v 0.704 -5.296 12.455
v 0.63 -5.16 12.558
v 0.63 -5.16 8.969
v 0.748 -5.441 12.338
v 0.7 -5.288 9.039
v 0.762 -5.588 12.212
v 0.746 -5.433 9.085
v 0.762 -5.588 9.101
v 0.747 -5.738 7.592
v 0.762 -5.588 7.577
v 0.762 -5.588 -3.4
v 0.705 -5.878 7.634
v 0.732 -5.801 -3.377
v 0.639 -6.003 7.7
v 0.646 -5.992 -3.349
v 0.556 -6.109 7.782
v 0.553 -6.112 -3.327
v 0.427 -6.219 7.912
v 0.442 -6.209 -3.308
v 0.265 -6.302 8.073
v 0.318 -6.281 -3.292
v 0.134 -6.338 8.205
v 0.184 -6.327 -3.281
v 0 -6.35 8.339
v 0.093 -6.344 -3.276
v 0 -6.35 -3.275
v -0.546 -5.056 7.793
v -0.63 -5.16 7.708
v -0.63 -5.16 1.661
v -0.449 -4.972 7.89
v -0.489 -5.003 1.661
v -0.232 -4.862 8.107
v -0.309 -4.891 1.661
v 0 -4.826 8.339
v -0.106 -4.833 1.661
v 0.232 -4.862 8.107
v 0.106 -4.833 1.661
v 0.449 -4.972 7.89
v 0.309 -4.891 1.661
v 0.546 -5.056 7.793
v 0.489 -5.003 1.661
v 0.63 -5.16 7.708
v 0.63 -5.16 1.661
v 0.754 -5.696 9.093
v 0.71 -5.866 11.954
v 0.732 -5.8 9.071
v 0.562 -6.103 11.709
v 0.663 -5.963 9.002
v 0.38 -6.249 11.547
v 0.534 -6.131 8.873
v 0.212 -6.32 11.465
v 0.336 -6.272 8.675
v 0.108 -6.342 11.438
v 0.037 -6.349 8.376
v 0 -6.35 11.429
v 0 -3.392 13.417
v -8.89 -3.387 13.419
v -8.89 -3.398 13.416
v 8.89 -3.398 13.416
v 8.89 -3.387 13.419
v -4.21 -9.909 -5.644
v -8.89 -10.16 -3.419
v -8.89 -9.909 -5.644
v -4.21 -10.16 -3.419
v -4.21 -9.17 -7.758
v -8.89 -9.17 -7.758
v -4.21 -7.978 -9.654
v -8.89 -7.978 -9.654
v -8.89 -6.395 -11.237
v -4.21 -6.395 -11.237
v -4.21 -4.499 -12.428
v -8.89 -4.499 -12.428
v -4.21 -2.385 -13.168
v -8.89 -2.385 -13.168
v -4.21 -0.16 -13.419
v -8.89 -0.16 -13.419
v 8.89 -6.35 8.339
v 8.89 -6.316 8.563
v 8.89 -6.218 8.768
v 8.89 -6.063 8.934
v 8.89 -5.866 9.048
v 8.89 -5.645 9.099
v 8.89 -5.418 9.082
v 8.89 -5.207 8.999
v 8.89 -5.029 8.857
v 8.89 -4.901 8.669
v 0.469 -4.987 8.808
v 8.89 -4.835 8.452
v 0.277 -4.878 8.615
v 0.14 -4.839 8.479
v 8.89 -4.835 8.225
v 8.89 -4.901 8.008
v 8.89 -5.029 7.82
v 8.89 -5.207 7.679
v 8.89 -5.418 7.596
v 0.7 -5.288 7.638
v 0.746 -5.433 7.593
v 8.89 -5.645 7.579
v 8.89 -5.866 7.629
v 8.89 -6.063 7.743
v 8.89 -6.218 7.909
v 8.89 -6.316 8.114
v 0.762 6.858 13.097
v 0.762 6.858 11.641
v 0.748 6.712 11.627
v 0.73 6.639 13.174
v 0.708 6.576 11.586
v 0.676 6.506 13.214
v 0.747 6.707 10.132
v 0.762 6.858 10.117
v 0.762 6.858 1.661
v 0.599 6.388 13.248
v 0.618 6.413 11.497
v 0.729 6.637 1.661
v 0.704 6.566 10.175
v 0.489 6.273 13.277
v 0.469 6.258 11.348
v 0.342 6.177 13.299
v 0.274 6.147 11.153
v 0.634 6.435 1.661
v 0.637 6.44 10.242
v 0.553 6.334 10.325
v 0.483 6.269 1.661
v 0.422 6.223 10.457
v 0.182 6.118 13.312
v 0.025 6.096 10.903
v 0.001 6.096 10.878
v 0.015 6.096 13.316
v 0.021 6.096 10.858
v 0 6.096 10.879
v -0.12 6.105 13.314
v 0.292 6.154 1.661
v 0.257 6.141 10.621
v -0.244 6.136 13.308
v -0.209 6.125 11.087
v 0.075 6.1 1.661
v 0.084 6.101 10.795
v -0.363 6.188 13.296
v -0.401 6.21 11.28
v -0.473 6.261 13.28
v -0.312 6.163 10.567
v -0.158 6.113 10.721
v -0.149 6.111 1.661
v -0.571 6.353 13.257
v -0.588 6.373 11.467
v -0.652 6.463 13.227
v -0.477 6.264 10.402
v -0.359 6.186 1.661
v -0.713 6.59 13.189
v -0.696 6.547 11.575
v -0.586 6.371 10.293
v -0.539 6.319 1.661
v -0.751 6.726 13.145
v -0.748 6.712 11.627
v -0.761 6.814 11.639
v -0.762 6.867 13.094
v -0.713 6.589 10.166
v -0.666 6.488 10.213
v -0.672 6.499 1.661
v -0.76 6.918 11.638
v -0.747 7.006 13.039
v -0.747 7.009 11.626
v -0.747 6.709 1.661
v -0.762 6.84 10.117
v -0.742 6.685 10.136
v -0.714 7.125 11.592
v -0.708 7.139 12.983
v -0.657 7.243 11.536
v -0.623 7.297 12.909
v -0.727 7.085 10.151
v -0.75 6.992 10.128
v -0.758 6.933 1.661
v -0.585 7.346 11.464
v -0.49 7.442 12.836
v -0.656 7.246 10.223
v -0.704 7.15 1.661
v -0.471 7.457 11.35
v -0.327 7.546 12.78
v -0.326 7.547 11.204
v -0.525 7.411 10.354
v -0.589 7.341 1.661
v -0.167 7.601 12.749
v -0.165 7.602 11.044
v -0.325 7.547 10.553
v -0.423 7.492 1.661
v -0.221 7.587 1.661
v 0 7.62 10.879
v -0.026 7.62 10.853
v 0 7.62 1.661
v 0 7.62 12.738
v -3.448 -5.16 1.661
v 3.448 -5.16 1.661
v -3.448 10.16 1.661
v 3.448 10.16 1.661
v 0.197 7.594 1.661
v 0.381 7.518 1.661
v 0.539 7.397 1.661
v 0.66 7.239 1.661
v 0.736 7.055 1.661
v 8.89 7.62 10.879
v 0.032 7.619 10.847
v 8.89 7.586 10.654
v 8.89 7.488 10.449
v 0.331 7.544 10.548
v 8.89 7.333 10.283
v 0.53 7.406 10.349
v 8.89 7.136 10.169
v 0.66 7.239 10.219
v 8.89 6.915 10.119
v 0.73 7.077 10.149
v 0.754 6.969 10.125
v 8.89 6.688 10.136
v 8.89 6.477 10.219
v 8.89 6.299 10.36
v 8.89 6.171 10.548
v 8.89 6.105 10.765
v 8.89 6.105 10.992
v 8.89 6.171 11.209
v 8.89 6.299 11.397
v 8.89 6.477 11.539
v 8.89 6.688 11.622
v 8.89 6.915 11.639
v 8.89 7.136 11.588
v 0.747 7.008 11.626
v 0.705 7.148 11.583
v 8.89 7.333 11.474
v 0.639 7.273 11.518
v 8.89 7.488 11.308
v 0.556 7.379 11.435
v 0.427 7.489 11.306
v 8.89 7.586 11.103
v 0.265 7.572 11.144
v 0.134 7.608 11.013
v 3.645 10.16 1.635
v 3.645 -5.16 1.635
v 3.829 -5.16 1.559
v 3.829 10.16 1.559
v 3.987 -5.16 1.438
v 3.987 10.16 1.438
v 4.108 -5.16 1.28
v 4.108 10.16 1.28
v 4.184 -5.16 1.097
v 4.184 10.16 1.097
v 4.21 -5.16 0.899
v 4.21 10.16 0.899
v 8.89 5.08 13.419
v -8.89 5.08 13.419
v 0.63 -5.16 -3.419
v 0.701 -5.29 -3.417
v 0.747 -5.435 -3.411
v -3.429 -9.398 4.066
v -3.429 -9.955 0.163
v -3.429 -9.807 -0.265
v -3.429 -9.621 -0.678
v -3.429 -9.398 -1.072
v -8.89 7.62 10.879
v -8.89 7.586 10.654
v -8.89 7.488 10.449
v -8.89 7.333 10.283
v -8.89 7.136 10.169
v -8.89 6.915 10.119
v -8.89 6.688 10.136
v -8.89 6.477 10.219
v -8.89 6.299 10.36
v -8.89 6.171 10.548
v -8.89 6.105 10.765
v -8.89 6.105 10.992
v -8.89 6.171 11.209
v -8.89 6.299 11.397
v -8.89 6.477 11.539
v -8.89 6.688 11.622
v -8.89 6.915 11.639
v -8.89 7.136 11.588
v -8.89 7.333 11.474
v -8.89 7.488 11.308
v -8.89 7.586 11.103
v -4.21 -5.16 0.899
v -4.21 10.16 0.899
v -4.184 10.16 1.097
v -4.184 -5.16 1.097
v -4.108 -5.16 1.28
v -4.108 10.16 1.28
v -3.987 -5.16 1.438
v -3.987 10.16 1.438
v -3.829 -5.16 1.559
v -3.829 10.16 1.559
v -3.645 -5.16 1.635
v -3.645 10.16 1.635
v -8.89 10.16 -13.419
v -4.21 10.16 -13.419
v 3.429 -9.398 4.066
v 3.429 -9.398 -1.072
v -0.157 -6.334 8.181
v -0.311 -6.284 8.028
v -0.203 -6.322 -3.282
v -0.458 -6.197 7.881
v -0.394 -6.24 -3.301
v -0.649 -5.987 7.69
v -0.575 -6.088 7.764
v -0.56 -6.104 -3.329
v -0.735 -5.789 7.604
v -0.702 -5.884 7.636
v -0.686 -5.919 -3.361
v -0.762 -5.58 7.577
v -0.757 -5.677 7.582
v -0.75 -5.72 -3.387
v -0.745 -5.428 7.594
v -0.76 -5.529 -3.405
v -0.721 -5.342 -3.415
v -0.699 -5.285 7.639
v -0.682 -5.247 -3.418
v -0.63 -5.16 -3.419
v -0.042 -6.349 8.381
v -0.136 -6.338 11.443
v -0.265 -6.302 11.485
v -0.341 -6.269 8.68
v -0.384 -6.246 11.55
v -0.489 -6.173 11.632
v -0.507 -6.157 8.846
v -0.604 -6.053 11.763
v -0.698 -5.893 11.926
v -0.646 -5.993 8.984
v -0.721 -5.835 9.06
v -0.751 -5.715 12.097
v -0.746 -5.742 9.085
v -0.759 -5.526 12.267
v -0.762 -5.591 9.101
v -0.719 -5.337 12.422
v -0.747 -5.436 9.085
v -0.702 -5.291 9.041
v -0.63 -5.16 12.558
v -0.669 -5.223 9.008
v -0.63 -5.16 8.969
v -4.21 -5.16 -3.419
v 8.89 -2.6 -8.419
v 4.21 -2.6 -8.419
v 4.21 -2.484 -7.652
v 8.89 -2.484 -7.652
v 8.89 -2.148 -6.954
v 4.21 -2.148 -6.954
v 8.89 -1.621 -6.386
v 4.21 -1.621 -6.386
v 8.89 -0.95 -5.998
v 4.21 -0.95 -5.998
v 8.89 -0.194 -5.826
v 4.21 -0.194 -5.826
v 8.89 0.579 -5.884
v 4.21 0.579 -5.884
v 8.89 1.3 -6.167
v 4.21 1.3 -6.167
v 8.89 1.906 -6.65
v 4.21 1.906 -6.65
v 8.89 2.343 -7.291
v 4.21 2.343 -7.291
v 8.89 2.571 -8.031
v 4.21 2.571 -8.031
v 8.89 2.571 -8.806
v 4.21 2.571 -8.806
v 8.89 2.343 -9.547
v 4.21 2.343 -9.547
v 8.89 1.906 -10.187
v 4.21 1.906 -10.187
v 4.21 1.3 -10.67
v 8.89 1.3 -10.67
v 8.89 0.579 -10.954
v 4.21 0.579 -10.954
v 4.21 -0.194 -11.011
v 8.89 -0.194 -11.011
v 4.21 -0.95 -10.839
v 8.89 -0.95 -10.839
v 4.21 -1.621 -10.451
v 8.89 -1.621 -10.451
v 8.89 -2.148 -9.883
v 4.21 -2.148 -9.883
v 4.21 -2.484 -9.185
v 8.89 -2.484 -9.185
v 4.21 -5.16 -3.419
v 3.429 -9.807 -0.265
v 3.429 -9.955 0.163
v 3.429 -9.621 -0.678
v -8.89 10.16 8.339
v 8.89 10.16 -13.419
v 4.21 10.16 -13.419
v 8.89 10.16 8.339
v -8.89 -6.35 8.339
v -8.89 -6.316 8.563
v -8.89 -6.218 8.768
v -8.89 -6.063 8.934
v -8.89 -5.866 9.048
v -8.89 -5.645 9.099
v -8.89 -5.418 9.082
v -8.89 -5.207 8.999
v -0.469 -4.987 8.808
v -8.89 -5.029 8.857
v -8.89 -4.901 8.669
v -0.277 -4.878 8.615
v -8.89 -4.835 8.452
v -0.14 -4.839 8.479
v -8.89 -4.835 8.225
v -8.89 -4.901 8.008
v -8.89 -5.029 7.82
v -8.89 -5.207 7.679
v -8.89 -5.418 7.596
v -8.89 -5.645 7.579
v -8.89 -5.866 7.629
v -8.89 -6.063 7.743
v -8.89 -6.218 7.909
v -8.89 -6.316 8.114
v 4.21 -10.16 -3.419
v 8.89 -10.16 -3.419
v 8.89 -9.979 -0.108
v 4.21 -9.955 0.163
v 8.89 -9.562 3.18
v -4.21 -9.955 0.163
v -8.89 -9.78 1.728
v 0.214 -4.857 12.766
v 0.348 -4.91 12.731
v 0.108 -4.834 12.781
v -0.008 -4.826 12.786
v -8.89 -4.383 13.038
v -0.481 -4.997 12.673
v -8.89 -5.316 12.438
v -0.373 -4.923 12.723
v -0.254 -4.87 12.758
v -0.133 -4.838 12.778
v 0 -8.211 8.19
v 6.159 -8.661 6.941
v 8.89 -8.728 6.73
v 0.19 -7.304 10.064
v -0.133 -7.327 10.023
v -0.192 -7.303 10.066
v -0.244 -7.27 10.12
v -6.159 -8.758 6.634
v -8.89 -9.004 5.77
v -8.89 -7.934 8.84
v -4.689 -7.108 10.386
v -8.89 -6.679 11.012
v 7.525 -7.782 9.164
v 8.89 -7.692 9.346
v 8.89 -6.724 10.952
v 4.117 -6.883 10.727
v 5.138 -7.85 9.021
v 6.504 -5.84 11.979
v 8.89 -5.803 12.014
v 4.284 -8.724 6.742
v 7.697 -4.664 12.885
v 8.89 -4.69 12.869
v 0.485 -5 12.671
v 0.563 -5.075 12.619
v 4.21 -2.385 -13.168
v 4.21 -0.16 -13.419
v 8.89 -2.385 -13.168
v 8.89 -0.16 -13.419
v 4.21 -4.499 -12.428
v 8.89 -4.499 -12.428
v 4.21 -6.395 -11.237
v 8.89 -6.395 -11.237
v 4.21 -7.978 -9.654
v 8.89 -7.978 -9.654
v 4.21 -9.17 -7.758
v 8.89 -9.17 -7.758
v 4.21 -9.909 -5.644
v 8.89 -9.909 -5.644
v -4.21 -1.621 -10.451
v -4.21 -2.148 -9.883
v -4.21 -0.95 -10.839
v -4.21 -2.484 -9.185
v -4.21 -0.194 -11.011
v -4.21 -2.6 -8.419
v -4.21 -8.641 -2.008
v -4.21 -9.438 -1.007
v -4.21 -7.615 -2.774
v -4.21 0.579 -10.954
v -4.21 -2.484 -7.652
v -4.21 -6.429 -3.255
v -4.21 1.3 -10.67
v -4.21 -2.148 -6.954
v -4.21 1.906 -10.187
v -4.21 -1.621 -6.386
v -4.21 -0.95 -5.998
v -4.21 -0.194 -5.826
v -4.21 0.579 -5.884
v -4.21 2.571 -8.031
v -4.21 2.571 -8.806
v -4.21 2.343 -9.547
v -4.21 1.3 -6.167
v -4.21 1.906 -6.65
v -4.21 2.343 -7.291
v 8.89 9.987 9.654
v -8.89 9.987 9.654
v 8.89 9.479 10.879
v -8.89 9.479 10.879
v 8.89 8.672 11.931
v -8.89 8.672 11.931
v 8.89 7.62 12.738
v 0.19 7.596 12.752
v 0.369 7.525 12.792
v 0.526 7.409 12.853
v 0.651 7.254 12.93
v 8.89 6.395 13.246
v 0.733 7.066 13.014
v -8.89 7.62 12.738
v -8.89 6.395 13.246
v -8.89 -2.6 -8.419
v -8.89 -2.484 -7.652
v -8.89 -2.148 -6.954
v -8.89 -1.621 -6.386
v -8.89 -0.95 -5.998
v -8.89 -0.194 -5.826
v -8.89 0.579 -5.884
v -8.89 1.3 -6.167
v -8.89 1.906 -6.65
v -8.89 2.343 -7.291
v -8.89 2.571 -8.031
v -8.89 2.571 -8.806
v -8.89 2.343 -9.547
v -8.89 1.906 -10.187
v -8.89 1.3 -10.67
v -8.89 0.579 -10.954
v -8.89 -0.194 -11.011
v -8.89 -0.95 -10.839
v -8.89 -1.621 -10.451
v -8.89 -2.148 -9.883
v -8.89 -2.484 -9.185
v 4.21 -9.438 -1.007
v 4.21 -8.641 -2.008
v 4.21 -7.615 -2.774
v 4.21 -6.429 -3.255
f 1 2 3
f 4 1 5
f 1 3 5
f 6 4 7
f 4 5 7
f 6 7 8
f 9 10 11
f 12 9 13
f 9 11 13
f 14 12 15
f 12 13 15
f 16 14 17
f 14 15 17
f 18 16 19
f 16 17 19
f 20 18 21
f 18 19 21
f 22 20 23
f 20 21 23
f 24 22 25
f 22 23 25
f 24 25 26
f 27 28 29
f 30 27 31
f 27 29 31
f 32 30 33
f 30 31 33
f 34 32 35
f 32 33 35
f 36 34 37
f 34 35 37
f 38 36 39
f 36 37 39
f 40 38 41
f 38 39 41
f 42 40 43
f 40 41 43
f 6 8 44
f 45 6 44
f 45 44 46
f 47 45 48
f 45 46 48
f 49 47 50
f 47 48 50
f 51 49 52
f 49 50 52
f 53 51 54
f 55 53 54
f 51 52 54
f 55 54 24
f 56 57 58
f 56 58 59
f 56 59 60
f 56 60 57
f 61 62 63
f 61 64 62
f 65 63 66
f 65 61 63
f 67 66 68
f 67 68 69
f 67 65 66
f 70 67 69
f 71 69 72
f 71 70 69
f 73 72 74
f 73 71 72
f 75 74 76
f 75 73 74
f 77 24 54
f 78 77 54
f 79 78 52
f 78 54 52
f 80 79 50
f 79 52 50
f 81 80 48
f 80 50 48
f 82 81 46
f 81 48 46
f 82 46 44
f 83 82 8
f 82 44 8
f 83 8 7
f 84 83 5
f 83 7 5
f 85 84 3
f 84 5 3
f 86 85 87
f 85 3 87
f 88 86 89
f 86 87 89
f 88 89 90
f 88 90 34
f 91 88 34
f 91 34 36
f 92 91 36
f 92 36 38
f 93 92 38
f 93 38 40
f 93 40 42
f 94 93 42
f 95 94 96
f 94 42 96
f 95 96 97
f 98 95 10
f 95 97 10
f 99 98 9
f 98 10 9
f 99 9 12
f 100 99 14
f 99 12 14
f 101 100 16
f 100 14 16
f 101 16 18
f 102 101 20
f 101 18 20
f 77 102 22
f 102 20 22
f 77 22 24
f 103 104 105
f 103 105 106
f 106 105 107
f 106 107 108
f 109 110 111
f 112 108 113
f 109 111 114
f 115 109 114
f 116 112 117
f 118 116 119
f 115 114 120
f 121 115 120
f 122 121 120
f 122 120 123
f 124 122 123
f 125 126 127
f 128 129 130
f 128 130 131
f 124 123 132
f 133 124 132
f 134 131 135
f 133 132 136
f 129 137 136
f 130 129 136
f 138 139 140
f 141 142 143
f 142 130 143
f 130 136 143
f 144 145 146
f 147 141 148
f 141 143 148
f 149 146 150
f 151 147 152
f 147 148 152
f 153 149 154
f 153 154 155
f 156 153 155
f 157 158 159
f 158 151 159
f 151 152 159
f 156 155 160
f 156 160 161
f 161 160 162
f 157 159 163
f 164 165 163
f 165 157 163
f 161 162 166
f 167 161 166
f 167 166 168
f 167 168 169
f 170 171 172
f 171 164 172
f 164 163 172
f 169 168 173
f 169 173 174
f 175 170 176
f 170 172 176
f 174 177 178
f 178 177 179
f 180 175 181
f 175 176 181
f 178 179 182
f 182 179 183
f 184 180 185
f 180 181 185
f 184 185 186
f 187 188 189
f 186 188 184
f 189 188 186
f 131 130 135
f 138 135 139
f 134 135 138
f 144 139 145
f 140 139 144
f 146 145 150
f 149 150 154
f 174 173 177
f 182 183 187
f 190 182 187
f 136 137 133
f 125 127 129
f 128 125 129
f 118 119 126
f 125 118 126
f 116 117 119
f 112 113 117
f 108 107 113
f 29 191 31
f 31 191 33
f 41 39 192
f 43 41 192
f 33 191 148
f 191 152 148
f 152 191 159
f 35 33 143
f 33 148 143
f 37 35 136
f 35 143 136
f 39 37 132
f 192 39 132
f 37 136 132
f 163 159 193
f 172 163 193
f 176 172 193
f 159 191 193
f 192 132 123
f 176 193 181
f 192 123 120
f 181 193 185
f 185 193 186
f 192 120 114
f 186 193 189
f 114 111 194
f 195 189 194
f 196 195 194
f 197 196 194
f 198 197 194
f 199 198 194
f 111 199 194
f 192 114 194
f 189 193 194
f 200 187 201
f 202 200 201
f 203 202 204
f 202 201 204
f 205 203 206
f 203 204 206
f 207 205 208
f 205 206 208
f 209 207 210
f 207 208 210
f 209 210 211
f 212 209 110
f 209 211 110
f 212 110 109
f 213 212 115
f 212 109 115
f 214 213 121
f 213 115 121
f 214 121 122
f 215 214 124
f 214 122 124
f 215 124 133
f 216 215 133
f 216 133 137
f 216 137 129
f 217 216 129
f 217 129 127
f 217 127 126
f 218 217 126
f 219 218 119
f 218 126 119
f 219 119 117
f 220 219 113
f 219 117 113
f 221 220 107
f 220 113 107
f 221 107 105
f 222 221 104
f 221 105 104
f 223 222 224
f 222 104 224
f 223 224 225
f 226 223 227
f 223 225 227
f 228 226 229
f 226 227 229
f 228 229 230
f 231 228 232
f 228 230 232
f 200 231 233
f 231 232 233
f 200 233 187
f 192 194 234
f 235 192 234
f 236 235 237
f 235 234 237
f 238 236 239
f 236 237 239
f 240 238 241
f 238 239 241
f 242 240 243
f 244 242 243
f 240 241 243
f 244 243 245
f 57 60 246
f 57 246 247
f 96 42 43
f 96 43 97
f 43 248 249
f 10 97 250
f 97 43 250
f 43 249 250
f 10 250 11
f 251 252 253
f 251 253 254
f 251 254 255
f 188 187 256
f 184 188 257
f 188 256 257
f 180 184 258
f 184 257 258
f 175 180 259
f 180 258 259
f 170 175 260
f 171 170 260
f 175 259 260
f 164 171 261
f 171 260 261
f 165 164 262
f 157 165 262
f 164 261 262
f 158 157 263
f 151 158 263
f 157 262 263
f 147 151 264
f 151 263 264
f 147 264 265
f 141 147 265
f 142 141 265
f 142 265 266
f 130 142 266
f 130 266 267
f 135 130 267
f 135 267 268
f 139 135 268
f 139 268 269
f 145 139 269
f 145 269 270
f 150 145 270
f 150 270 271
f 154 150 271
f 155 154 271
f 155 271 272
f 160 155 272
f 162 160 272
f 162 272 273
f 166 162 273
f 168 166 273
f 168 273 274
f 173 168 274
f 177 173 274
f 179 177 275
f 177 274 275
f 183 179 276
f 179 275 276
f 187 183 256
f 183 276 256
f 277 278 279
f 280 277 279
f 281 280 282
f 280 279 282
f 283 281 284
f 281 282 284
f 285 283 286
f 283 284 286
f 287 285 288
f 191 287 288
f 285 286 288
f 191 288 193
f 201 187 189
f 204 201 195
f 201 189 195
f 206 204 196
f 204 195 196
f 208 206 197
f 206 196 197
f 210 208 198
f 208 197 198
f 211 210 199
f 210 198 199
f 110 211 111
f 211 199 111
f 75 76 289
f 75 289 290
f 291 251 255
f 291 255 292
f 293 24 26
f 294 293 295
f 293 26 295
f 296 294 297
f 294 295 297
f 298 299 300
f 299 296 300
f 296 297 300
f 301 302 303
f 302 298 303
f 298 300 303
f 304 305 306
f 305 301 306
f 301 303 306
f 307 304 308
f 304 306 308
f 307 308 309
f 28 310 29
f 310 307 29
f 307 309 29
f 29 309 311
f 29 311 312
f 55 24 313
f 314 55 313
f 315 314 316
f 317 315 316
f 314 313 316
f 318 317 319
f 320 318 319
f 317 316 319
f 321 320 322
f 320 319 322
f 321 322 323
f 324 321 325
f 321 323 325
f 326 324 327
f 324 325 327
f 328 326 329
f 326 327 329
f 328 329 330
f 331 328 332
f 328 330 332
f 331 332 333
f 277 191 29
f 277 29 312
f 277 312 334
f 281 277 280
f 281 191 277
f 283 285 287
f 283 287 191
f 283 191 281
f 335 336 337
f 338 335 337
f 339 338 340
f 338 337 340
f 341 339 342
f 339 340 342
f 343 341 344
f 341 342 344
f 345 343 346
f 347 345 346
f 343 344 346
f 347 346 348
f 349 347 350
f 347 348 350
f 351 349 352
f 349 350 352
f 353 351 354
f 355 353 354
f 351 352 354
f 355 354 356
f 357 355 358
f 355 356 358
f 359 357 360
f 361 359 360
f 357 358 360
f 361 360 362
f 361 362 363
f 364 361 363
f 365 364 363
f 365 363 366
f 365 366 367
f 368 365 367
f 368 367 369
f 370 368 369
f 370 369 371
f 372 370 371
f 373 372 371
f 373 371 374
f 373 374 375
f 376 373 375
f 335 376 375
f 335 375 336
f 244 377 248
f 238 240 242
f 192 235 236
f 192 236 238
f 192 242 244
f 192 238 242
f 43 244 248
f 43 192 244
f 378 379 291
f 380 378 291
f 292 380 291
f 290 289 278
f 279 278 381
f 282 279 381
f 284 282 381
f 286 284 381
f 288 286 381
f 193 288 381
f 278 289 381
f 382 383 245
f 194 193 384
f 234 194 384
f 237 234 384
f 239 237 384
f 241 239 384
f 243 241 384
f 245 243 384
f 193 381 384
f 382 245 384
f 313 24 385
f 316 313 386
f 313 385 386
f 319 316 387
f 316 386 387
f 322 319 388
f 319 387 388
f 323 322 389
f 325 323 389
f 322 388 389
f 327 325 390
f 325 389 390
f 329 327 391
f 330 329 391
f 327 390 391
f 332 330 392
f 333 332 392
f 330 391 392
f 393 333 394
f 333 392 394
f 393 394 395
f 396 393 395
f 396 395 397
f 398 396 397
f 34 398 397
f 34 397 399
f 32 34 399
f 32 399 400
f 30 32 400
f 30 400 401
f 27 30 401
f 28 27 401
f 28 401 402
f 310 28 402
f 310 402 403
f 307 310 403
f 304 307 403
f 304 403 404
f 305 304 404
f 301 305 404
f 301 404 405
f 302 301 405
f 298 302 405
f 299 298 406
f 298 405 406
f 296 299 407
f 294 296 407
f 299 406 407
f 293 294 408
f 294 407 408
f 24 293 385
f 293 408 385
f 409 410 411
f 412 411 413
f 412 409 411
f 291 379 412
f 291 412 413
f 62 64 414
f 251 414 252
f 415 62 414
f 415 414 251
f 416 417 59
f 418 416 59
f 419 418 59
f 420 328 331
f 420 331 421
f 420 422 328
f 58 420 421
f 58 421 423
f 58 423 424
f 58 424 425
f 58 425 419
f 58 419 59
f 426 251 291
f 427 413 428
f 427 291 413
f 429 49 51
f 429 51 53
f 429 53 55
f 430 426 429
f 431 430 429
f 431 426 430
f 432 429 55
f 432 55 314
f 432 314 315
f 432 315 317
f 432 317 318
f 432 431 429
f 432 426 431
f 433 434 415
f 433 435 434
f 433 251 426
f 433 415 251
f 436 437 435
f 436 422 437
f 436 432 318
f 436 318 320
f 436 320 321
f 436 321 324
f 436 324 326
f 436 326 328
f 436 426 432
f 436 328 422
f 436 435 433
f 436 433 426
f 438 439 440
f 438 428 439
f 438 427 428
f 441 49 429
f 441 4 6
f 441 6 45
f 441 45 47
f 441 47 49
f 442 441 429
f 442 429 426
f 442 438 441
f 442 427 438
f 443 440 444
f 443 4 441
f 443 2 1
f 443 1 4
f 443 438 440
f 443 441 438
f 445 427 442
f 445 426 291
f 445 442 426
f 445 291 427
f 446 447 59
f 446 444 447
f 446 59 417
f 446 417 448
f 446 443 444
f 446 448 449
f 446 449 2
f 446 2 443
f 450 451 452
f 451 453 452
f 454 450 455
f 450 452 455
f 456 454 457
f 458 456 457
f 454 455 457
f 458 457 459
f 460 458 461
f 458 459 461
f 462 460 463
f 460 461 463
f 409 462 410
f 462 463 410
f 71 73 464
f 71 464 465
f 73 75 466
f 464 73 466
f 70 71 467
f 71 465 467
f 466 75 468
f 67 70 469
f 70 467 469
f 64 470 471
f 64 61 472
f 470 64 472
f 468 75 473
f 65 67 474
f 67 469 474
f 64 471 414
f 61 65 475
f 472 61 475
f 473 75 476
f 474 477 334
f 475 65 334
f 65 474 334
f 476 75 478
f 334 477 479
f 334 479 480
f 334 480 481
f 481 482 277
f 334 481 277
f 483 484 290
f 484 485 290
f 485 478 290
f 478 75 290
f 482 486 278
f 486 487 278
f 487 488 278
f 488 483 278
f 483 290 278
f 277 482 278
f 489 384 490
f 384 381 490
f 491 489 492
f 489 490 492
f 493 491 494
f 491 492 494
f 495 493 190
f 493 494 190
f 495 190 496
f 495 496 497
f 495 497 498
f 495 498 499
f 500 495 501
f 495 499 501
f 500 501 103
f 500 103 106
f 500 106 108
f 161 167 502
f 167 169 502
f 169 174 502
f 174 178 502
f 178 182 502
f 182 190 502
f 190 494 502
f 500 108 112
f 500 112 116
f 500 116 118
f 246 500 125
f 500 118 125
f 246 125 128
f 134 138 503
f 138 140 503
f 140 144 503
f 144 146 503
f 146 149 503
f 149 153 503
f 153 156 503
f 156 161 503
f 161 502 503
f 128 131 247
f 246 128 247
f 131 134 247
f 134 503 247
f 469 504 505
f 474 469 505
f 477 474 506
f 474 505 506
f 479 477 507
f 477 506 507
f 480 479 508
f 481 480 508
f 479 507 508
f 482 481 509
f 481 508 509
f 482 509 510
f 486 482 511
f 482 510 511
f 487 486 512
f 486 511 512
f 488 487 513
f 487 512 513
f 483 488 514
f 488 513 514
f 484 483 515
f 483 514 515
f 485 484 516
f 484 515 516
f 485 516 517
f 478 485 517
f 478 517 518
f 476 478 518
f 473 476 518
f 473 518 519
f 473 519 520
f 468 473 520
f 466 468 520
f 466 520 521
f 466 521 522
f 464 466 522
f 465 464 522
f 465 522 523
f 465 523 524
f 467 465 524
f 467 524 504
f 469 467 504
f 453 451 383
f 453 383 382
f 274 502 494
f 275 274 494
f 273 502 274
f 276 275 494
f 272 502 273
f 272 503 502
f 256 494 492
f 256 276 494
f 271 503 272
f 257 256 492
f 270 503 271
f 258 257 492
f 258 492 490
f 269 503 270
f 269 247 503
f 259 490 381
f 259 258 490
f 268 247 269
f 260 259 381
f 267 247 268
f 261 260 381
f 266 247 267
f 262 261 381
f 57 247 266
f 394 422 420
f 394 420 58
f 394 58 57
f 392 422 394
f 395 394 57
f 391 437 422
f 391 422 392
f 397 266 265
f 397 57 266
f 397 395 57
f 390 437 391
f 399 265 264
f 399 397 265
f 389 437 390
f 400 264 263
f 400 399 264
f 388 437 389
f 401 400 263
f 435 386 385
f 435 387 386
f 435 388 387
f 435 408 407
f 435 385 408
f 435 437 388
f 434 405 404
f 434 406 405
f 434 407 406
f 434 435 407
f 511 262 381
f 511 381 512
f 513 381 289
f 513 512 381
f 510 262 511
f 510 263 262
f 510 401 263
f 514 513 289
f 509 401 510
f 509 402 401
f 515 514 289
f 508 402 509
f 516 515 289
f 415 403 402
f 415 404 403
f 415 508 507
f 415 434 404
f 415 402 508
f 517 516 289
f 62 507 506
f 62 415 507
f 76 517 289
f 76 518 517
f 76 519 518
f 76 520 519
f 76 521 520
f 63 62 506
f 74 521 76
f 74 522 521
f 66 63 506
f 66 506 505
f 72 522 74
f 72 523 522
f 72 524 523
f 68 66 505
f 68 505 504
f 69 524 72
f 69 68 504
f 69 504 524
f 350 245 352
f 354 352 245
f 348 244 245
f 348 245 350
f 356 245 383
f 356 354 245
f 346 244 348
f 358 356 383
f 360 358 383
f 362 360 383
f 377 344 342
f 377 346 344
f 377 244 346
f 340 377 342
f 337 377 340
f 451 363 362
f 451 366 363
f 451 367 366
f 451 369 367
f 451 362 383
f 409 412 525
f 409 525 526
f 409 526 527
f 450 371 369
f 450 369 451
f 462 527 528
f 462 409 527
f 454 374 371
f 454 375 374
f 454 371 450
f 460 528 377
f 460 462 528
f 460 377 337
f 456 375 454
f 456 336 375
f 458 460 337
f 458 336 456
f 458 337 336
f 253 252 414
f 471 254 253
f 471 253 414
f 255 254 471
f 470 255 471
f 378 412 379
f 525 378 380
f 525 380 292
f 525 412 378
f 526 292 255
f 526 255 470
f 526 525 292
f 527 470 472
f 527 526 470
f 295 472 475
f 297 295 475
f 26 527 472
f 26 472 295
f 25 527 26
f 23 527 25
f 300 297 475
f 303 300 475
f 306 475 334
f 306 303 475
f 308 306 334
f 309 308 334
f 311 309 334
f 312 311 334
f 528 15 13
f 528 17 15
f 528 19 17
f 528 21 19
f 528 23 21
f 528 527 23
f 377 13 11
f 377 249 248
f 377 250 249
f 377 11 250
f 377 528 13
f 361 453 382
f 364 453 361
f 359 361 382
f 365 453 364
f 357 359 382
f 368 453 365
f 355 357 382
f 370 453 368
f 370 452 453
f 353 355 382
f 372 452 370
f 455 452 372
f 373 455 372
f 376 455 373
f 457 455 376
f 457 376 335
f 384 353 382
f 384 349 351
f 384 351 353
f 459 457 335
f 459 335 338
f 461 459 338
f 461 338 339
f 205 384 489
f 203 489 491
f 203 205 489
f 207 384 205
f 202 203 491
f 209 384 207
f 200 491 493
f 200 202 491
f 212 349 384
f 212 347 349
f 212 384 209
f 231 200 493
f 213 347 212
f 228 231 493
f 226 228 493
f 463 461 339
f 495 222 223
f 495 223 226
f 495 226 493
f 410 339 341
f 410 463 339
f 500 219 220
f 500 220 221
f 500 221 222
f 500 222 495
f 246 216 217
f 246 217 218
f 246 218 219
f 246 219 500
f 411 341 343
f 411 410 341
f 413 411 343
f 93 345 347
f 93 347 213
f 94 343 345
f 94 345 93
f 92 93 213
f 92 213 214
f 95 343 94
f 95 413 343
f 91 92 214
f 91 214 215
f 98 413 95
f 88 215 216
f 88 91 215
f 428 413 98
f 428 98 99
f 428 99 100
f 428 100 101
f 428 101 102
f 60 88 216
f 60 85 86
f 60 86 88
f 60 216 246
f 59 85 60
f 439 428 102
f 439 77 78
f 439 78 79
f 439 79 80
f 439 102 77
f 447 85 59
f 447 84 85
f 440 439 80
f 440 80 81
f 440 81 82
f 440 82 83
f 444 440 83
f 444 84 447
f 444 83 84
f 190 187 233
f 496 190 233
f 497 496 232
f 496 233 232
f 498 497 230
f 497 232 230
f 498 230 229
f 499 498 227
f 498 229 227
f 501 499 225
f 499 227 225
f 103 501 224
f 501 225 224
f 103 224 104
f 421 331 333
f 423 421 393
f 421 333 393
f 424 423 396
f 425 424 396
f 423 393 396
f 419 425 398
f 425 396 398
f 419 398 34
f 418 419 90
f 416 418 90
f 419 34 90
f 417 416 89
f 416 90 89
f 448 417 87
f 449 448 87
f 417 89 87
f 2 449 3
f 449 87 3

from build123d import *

# Parameters (mm, degrees)
F1_DEPTH  = 10.16
F2_R      = 2.6
F3_DEPTH  = 17.781
F4_R      = 10
F5_R      = 5
F7_DEPTH  = 17.781
F8_R      = 5.08
F10_DEPTH = 16.8384001672
F11_R     = 0.762
F12_DEPTH = 17.7810001
F16_DEPTH = 15.32
F17_DEPTH = 0.762


# Not quite as in the source:
# - an extrude ends at something that could not be found from the text; its depth is read off the source's solid
# - a feature names something its author has since deleted; it is built from what else it names


with BuildPart() as f1:
    # F0 (on Front) → F1 (new body, symmetric)
    with BuildSketch(Plane.XZ):
        Polygon((4.21, -13.4187000336), (8.89, -13.4187000336), (8.89, 13.4187000336), (-8.89, 13.4187000336), (-8.89, -13.4187000336), (-4.21, -13.4187000336), (-4.21, -3.4187000336), (4.21, -3.4187000336), align=None)
    extrude(amount=F1_DEPTH, both=True)

    # F2 (on face) → F3 (cut, through all)
    with BuildSketch(Plane(origin=(-8.89, 0, 0), x_dir=(0, -1, 0), z_dir=(-1, 0, 0))):
        with Locations((0, -8.4187000336)):
            Circle(F2_R)
    extrude(amount=-F3_DEPTH, mode=Mode.SUBTRACT)

    # F4
    f4_edges = [f1.edges().sort_by_distance(p)[0] for p in [
        (6.55, -10.16, -13.4187),
        (-6.55, -10.16, -13.4187),
    ]]
    fillet(f4_edges, radius=F4_R)

    # F5
    f5_edges = [f1.edges().sort_by_distance(p)[0] for p in [
        (0, -10.16, -3.4187),
    ]]
    fillet(f5_edges, radius=F5_R)

    # F6 (on face) → F7 (cut, through all)
    with BuildSketch(Plane(origin=(-8.89, 0, 0), x_dir=(0, -1, 0), z_dir=(-1, 0, 0))):
        with BuildLine():
            Line((10.16, -3.4187000336), (10.16, 13.4187000336))
            Line((10.16, 13.4187000336), (3.3866666667, 13.4187000336))
            add(Edge.make_bspline(
                [(3.3981708443, 13.4156480579), (3.3924205969, 13.4171809572), (3.3866666667, 13.4187000336)],
                knots=[0, 0, 0, 0.0008386489, 0.0008386489, 0.0008386489], degree=2, weights=[1, 0.9999999121, 1]))
            add(Edge.make_bspline(
                [(10.16, -3.4187000336), (9.7910592754, 11.7114337008), (3.3981708443, 13.4156480579)],
                knots=[5.4107177834, 5.4107177834, 5.4107177834, 6.2831853072, 6.2831853072, 6.2831853072], degree=2, weights=[1, 0.9063494321, 1]))
        make_face()
    extrude(amount=-F7_DEPTH, mode=Mode.SUBTRACT)

    # F8
    f8_edges = [f1.edges().sort_by_distance(p)[0] for p in [
        (0, 10.16, 13.4187),
    ]]
    fillet(f8_edges, radius=F8_R)

    # F9 (on face) → F10 (cut, through all)
    with BuildSketch(Plane(origin=(0, 0, -3.4187000336), x_dir=(1, 0, 0), z_dir=(0, 0, -1))):
        with BuildLine():
            Line((0.6304442878, 5.16), (-0.6304442878, 5.16))
            ThreePointArc((-0.6304442878, 5.16), (0, 4.826), (0.6304442878, 5.16))
        make_face()
        with BuildLine():
            ThreePointArc((0, 6.35), (-0.6733424092, 5.9447267862), (-0.6304442878, 5.16))
            Line((-0.6304442878, 5.16), (0.6304442878, 5.16))
            ThreePointArc((0.6304442878, 5.16), (0.7283689132, 5.364118946), (0.762, 5.588))
            ThreePointArc((0.762, 5.588), (0.5388153673, 6.1268153673), (0, 6.35))
        make_face()
        with BuildLine():
            ThreePointArc((0.762, -6.858), (-0.5388153673, -6.3191846327), (0, -7.62))
            ThreePointArc((0, -7.62), (0.5388153673, -7.3968153673), (0.762, -6.858))
        make_face()
    extrude(amount=-F10_DEPTH, mode=Mode.SUBTRACT)

    # F11 (on face) → F12 (cut, through all)
    with BuildSketch(Plane(origin=(-8.89, 0, 0), x_dir=(0, -1, 0), z_dir=(-1, 0, 0))):
        with BuildLine():
            ThreePointArc((-6.096, 10.8787000336), (-6.858, 11.6407000336), (-7.62, 10.8787000336))
            ThreePointArc((-7.62, 10.8787000336), (-6.858, 10.1167000336), (-6.096, 10.8787000336))
        make_face()
        with Locations((5.588, 8.3387000336)):
            Circle(F11_R)
    extrude(amount=-F12_DEPTH, mode=Mode.SUBTRACT)

    # F15 (on face) → F16 (cut, through all)
    with BuildSketch(Plane(origin=(0, 10.16, 0), x_dir=(-1, 0, 0), z_dir=(0, 1, 0))):
        with BuildLine():
            Line((0, -3.4187000336), (0, 1.6612999664))
            Line((0, 1.6612999664), (-3.448, 1.6612999664))
            ThreePointArc((-3.448, 1.6612999664), (-3.9868153673, 1.4381153337), (-4.21, 0.8992999664))
            Line((-4.21, 0.8992999664), (-4.21, -3.4187000336))
            Line((-4.21, -3.4187000336), (0, -3.4187000336))
        make_face()
        with BuildLine():
            Line((3.448, 1.6612999664), (0, 1.6612999664))
            Line((0, 1.6612999664), (0, -3.4187000336))
            Line((0, -3.4187000336), (4.21, -3.4187000336))
            Line((4.21, -3.4187000336), (4.21, 0.8992999664))
            ThreePointArc((4.21, 0.8992999664), (3.9868153673, 1.4381153337), (3.448, 1.6612999664))
        make_face()
    extrude(amount=-F16_DEPTH, mode=Mode.SUBTRACT)

    # F14 (on face) → F17 (cut)
    with BuildSketch(Plane.XZ.offset(10.16)):
        with BuildLine():
            Line((0, 6.9417000336), (3.429, 6.9417000336))
            ThreePointArc((3.429, 6.9417000336), (2.4246691527, 9.3663691863), (0, 10.3707000336))
            ThreePointArc((0, 10.3707000336), (-2.4246691527, 9.3663691863), (-3.429, 6.9417000336))
            Line((-3.429, 6.9417000336), (0, 6.9417000336))
        make_face()
        with BuildLine():
            ThreePointArc((-3.429, 6.9417000336), (0, 3.5127000336), (3.429, 6.9417000336))
            Line((3.429, 6.9417000336), (0, 6.9417000336))
            Line((0, 6.9417000336), (-3.429, 6.9417000336))
        make_face()
        with BuildLine():
            Line((3.429, -3.4187000336), (3.429, 6.9417000336))
            ThreePointArc((3.429, 6.9417000336), (0, 3.5127000336), (-3.429, 6.9417000336))
            Line((-3.429, 6.9417000336), (-3.429, -3.4187000336))
            Line((-3.429, -3.4187000336), (3.429, -3.4187000336))
        make_face()
    extrude(amount=-F17_DEPTH, mode=Mode.SUBTRACT)


solid = f1.part
